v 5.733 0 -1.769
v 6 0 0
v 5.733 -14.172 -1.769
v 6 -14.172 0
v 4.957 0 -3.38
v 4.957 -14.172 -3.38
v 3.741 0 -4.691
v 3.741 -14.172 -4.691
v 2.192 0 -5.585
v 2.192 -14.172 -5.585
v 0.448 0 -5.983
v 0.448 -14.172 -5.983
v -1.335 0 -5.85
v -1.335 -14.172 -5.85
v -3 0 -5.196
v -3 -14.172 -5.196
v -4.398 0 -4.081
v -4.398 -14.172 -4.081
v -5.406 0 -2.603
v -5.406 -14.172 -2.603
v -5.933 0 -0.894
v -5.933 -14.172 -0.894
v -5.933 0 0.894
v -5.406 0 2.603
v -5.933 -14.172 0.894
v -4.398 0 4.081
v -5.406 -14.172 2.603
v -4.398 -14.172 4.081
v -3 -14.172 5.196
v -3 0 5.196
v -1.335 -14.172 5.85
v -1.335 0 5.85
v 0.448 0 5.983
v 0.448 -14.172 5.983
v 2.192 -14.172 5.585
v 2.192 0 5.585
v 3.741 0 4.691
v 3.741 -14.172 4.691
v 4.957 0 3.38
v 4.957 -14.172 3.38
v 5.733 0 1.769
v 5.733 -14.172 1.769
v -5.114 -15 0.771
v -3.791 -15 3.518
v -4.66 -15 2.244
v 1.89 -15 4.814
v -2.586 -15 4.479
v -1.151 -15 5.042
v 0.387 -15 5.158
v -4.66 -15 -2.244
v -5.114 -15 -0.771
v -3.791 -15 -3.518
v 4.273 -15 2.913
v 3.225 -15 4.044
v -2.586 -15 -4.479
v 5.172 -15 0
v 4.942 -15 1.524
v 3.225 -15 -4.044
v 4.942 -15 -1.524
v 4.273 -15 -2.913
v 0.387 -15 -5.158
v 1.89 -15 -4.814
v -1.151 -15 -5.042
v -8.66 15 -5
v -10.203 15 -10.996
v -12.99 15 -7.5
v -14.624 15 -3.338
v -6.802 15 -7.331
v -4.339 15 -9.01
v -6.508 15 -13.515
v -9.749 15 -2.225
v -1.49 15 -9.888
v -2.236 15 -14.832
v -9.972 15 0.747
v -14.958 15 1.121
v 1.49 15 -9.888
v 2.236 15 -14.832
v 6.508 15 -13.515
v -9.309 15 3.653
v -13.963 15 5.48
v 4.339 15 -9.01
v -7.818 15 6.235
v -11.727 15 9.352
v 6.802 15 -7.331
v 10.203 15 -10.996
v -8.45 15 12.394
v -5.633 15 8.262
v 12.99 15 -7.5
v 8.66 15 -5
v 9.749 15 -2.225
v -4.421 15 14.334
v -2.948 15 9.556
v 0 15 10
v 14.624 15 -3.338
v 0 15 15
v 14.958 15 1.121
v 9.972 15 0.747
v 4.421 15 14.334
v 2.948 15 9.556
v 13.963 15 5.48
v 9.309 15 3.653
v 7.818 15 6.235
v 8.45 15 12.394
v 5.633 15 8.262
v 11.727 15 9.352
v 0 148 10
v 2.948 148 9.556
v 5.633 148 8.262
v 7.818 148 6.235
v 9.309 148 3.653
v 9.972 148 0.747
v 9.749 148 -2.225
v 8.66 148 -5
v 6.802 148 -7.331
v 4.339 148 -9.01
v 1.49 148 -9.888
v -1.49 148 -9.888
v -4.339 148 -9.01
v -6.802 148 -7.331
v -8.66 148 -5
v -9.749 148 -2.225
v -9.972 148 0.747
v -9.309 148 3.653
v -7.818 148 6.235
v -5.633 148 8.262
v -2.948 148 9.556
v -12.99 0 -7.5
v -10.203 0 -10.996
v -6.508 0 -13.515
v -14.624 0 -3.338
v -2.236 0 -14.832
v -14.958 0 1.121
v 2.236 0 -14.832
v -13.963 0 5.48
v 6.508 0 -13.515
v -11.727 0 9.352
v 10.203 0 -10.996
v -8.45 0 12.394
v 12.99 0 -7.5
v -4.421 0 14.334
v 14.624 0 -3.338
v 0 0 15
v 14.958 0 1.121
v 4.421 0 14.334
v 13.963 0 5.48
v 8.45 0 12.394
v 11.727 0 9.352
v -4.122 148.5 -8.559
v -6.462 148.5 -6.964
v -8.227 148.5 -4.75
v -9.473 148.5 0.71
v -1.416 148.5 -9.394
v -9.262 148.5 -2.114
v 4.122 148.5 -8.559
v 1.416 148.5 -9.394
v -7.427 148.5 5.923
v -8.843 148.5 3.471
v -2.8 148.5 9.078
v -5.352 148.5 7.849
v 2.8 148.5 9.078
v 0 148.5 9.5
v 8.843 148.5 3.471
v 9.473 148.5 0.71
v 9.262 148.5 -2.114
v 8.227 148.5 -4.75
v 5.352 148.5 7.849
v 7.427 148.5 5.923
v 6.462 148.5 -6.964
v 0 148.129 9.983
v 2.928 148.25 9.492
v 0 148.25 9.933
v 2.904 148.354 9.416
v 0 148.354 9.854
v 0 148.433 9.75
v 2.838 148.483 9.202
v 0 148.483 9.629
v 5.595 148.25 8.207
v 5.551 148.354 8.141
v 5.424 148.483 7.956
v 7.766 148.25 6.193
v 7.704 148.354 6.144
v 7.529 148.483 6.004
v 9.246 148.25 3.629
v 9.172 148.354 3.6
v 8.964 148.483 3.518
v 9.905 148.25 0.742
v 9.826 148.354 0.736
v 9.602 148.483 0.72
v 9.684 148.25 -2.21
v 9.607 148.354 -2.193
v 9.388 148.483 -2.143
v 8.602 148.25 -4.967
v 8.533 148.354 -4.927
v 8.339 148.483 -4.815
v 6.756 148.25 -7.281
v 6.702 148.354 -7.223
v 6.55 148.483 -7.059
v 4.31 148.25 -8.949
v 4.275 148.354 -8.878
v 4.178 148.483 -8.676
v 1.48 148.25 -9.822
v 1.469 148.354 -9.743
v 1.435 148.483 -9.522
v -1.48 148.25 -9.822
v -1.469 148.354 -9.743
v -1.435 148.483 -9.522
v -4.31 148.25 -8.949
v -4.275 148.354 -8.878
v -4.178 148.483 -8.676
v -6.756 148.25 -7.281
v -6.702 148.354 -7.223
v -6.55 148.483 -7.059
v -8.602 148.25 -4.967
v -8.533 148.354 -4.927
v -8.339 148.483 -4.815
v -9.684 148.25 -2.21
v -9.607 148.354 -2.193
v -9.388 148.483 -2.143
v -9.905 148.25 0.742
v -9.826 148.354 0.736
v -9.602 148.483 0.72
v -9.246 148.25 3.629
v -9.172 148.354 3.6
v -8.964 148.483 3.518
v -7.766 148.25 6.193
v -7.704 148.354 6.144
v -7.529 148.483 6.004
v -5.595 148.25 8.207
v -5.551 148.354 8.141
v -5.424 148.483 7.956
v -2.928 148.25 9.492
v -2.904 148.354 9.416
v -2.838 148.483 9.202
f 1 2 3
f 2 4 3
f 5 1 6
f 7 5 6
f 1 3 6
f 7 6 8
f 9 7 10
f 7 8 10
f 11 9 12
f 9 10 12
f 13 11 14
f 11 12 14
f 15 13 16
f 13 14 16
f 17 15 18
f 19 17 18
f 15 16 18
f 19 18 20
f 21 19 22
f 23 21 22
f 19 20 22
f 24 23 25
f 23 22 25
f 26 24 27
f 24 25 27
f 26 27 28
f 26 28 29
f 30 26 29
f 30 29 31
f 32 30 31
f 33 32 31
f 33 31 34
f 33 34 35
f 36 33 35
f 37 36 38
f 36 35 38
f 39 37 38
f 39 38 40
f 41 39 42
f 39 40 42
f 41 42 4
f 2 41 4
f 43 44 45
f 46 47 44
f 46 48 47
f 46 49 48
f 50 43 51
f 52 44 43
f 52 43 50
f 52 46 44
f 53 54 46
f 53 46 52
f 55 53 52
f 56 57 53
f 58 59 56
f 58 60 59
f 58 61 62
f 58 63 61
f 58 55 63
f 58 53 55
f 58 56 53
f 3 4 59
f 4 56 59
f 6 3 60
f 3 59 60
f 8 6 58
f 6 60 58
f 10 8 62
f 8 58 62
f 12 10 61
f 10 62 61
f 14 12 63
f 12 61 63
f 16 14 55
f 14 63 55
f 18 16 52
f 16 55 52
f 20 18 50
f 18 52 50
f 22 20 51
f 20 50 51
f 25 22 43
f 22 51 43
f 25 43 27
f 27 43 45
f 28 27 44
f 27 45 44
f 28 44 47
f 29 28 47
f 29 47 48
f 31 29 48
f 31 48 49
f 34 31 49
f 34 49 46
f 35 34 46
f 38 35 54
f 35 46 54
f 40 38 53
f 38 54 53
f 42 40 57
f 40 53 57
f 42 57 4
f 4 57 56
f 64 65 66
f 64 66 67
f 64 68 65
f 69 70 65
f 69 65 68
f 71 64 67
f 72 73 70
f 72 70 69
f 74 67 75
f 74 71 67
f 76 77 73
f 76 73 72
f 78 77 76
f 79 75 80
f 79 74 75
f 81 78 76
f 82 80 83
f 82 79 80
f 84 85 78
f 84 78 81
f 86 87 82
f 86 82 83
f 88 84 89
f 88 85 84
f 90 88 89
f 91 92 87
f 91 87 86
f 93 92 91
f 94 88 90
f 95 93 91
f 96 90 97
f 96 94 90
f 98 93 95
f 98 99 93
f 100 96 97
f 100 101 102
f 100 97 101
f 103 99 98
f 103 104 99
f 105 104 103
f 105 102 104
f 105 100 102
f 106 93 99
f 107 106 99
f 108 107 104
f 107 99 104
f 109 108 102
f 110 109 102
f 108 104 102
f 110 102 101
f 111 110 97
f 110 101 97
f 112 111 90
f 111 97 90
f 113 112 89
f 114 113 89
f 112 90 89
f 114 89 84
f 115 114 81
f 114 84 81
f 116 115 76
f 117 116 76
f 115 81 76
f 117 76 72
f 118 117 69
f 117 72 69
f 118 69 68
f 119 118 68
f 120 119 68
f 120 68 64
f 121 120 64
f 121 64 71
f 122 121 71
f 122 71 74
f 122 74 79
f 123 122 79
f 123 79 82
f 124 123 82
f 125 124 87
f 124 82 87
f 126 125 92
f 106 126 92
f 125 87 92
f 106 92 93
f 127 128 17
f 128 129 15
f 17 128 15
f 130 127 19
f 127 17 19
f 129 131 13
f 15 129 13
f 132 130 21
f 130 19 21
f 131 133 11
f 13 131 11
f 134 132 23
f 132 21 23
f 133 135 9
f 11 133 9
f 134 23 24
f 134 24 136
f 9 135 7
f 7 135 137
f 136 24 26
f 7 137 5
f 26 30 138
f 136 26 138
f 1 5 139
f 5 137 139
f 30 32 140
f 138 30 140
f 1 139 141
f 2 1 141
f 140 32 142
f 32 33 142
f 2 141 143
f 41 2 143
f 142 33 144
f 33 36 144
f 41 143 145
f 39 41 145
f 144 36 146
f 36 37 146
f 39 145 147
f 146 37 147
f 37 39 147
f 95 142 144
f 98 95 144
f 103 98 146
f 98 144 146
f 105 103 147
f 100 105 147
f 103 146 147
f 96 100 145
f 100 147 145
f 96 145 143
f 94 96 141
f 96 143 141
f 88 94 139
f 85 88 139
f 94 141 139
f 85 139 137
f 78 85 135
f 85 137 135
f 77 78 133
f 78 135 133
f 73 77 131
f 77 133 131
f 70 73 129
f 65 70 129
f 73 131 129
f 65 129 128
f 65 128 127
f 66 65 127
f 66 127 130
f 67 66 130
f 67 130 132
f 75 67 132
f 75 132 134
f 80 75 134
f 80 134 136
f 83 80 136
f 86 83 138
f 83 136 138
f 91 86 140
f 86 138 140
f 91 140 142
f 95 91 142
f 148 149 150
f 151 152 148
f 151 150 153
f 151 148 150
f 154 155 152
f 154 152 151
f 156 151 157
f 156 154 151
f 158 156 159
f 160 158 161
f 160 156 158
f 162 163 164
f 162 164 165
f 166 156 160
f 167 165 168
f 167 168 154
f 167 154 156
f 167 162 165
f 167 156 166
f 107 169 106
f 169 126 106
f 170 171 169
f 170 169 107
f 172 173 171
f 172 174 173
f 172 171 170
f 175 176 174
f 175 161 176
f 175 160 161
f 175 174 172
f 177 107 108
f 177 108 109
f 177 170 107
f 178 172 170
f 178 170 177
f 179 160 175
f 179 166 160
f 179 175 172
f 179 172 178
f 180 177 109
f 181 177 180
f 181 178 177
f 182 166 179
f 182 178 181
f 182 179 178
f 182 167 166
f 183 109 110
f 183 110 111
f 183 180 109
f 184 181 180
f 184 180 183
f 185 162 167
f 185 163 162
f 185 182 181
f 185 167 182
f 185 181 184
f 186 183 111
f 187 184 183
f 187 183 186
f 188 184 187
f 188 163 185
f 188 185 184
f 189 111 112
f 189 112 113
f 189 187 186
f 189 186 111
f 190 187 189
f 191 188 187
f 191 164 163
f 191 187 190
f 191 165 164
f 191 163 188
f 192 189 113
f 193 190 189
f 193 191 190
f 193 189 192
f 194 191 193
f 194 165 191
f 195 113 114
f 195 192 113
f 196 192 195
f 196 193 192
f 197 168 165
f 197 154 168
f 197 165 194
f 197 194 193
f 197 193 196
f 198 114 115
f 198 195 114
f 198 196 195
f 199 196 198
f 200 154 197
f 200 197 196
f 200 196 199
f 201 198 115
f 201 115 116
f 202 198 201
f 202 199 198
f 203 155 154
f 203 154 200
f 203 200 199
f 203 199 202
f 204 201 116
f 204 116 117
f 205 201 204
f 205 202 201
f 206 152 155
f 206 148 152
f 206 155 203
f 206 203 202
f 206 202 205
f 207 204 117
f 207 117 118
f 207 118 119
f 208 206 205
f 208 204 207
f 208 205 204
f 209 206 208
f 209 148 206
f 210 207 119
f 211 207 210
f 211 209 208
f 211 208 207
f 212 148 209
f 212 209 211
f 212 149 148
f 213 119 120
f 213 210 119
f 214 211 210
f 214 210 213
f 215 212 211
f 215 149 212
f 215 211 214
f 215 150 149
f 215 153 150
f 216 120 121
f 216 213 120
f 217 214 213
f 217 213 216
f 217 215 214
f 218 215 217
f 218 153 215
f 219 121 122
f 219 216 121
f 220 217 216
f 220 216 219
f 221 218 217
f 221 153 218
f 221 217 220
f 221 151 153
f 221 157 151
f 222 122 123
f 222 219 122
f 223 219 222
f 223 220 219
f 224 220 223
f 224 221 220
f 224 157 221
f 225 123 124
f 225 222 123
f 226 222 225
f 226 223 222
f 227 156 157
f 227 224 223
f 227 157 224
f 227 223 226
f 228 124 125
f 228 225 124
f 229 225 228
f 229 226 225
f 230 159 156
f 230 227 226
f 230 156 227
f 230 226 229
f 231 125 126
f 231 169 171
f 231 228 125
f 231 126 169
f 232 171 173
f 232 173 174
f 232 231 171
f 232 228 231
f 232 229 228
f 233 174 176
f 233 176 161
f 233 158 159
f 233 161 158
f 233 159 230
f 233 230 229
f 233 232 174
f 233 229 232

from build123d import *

# Parameters (mm, degrees)
SKETCH1_R           = 15
BOSS_EXTRUDE1_DEPTH = 15
SKETCH2_R           = 10
BOSS_EXTRUDE2_DEPTH = 133.5
SKETCH4_R           = 7.5
BOSS_EXTRUDE3_DEPTH = 15
FILLET1_R           = 0.5


# Read off the part's stored shape, not the designer's step: M12x1.5 Machine Threads Stud1
with BuildPart() as part:
    # Sketch1 → Boss-Extrude1 (new body)
    with BuildSketch(Plane(origin=(0, 0, 0), x_dir=(1, 0, 0), z_dir=(0, 1, 0))):
        with Locations(Location((0, 0, 0), (0, 0, 270))):
            Circle(SKETCH1_R)
    extrude(amount=BOSS_EXTRUDE1_DEPTH)

    # Sketch2 → Boss-Extrude2 (add)
    with BuildSketch(Plane(origin=(0, 15, 0), x_dir=(1, 0, 0), z_dir=(0, 1, 0))):
        with Locations(Location((0, 0, 0), (0, 0, 270))):
            Circle(SKETCH2_R)
    extrude(amount=BOSS_EXTRUDE2_DEPTH)

    # Sketch4 → Boss-Extrude3 (add)
    with BuildSketch(Plane.XZ):
        with Locations(Location((0, 0, 0), (0, 0, 270))):
            Circle(SKETCH4_R)
    extrude(amount=BOSS_EXTRUDE3_DEPTH)

    # M12x1.5 Machine Threads Stud1 outline → M12x1.5 Machine Threads Stud1 (revolve, cut)
    with BuildSketch(Plane.XY):
        Polygon((7.5, 0), (6, 0), (6, -14.172), (5.172, -15), (7.5, -15), align=None)
    revolve(axis=Axis((0, 0, 0), (0, 1, 0)), mode=Mode.SUBTRACT)

    # Fillet1
    fillet1_edges = [part.edges().sort_by_distance(p)[0] for p in [
        (0, 148.5, -10),
    ]]
    fillet(fillet1_edges, radius=FILLET1_R)


solid = part.part
